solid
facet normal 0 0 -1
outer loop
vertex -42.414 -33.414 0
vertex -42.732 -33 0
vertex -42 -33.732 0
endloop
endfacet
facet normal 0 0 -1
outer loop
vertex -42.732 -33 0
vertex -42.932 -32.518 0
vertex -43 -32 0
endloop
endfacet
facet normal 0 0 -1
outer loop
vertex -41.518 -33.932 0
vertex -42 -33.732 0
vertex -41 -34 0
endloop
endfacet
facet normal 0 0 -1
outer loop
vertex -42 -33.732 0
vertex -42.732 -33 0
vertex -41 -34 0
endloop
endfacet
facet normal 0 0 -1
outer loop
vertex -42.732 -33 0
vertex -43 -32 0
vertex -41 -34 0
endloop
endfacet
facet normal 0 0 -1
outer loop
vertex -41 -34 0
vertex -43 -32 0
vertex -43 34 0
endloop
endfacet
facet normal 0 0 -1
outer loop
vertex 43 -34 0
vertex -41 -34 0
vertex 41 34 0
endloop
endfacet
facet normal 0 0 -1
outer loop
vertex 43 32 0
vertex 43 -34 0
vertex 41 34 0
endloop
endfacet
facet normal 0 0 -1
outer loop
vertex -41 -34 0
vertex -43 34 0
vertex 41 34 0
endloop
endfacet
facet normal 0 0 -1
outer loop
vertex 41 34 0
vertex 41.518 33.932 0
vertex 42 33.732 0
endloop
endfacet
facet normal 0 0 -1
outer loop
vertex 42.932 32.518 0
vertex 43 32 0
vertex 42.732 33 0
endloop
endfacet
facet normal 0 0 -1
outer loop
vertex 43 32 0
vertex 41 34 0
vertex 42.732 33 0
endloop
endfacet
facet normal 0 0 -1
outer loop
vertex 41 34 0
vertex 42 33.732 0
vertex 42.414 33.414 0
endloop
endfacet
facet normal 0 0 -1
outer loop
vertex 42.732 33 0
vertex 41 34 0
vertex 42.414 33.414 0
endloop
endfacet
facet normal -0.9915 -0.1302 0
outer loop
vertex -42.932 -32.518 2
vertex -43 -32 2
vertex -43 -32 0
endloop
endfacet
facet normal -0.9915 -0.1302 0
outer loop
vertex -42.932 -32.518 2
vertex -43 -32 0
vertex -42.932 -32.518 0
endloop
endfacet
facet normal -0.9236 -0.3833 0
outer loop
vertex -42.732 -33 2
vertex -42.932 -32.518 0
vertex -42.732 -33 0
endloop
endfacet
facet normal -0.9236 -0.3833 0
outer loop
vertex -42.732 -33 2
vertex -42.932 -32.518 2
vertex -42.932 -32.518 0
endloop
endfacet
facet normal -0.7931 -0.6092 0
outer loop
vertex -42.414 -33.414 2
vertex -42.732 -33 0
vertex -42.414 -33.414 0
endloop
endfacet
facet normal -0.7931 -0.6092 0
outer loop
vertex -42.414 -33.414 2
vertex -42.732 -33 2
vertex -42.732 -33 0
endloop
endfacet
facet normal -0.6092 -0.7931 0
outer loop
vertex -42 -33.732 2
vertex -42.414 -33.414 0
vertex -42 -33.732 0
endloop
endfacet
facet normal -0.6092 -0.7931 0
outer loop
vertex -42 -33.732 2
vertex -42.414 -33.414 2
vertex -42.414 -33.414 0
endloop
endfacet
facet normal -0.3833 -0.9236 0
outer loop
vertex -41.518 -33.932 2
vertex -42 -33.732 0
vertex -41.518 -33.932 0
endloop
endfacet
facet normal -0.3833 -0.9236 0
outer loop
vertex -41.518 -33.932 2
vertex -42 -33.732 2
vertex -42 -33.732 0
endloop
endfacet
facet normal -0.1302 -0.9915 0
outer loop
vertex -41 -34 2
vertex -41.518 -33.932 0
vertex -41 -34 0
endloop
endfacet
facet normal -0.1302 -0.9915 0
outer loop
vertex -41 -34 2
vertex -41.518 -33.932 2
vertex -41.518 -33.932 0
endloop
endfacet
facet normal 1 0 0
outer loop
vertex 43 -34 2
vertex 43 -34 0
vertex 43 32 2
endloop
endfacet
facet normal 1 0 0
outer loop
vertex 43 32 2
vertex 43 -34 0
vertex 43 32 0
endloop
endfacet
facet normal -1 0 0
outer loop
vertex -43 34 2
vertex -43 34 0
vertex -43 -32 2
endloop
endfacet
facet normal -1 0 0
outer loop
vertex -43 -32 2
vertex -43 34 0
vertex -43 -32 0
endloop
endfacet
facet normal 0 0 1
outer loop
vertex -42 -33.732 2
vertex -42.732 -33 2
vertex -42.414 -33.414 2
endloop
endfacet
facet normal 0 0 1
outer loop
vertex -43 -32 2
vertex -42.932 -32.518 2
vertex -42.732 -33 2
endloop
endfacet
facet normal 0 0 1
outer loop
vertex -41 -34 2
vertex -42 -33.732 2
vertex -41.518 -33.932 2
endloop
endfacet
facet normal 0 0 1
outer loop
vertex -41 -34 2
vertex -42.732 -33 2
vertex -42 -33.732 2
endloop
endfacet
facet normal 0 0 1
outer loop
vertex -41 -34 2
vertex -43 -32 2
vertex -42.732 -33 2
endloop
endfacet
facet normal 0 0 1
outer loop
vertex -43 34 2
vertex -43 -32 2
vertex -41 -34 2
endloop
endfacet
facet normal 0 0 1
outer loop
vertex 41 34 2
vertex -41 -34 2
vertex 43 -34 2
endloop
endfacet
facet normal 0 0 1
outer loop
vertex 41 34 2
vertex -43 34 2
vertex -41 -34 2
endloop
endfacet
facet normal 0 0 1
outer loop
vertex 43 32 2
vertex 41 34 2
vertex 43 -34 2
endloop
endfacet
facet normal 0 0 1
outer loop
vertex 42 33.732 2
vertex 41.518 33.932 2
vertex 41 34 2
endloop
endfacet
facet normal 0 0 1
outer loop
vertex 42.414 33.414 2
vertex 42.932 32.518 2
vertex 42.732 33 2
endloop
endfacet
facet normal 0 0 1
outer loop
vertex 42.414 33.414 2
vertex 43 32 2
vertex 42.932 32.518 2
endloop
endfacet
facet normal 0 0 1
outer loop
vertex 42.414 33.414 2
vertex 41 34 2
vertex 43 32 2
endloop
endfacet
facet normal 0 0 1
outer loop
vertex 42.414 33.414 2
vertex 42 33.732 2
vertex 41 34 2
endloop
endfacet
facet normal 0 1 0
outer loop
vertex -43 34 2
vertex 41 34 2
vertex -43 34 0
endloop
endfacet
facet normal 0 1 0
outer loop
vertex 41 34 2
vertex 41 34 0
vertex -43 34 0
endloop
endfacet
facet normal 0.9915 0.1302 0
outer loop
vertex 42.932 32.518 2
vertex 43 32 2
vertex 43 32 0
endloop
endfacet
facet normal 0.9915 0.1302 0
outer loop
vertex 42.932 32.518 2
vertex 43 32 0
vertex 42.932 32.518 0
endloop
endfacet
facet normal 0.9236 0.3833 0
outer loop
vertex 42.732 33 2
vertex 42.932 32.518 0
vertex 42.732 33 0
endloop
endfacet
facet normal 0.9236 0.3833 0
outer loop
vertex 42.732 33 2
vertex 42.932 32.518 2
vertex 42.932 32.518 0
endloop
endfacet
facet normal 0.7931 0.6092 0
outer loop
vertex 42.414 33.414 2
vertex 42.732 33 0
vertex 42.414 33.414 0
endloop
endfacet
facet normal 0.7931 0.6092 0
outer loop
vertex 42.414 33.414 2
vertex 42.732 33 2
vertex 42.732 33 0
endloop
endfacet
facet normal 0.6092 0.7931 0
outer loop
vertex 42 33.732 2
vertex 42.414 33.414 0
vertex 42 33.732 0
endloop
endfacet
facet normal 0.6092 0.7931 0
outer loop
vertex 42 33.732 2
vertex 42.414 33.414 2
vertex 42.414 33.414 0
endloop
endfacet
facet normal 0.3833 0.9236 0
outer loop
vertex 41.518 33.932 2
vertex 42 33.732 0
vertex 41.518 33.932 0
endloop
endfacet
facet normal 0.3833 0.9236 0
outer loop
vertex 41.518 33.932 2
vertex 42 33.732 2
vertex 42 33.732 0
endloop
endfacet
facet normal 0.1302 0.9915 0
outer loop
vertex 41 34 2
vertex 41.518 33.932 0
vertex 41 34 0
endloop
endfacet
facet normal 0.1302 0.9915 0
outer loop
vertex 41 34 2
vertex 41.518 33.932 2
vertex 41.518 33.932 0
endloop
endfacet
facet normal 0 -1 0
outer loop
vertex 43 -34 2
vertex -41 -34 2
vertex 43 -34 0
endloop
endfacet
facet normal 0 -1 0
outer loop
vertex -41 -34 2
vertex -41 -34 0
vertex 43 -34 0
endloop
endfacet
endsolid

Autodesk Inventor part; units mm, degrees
ref_plane "YZ Plane" through (0, 0, 0) normal (1, 0, 0) x (0, 1, 0)
ref_plane "XZ Plane" through (0, 0, 0) normal (0, 1, 0) x (-1, 0, 0)
ref_plane "XY Plane" through (0, 0, 0) normal (0, 0, 1) x (1, 0, 0)
sketch "Sketch1" plane through (0, 0, 0) normal (0, 0, 1) x (1, 0, 0)
  line L0 (-43, -34) -> (43, -34)
  line L1 (43, -34) -> (43, 34)
  line L2 (43, 34) -> (-43, 34)
  line L3 (-43, 34) -> (-43, -34)
  line L4 (-43, -34) -> (43, 34) construction
  line L5 (43, -34) -> (-43, 34) construction
  point P0 (0, 0)
  dimension "d154" = 86
  dimension "d155" = 68
extrude "Plate5" add sketch "Sketch1" along normal blind 2
fillet "Corner Round1" radius 2 2 edges at (43, 34, 1) (-43, -34, 1)
sketch "Sketch11" plane through (-50.5, -22, -28) normal (1, 0, 0) x (0, 0, -1)
  line L0 (-25.25, 44) -> (-25.25, 0) construction
  line L1 (0, 0) -> (-25.25, 0) construction
  line L2 (0, 0) -> (0, 44) construction
  line L3 (0, 44) -> (-25.25, 44) construction
  circle A0 centre (-10, 22) radius 5.5
  point P0 (-28, 22)
  point P1 (0, 22)
  dimension "d192" = 11
  dimension "d193" = 10
cut "Cut3" [suppressed]
feature "Corner Round3" [suppressed]
sketch "Sketch10" plane through (-45, 34, 2) normal (1, 0, 0) x (0, 1, 0)
  line L0 (-66, 0) -> (0, 0)
  line L1 (0, 0) -> (0, -30)
  line L2 (0, -30) -> (-66, -30)
  line L3 (-66, -30) -> (-66, 0)
properties part number "ANP 1424 FDS diam way cup" material "Stainless Steel"
